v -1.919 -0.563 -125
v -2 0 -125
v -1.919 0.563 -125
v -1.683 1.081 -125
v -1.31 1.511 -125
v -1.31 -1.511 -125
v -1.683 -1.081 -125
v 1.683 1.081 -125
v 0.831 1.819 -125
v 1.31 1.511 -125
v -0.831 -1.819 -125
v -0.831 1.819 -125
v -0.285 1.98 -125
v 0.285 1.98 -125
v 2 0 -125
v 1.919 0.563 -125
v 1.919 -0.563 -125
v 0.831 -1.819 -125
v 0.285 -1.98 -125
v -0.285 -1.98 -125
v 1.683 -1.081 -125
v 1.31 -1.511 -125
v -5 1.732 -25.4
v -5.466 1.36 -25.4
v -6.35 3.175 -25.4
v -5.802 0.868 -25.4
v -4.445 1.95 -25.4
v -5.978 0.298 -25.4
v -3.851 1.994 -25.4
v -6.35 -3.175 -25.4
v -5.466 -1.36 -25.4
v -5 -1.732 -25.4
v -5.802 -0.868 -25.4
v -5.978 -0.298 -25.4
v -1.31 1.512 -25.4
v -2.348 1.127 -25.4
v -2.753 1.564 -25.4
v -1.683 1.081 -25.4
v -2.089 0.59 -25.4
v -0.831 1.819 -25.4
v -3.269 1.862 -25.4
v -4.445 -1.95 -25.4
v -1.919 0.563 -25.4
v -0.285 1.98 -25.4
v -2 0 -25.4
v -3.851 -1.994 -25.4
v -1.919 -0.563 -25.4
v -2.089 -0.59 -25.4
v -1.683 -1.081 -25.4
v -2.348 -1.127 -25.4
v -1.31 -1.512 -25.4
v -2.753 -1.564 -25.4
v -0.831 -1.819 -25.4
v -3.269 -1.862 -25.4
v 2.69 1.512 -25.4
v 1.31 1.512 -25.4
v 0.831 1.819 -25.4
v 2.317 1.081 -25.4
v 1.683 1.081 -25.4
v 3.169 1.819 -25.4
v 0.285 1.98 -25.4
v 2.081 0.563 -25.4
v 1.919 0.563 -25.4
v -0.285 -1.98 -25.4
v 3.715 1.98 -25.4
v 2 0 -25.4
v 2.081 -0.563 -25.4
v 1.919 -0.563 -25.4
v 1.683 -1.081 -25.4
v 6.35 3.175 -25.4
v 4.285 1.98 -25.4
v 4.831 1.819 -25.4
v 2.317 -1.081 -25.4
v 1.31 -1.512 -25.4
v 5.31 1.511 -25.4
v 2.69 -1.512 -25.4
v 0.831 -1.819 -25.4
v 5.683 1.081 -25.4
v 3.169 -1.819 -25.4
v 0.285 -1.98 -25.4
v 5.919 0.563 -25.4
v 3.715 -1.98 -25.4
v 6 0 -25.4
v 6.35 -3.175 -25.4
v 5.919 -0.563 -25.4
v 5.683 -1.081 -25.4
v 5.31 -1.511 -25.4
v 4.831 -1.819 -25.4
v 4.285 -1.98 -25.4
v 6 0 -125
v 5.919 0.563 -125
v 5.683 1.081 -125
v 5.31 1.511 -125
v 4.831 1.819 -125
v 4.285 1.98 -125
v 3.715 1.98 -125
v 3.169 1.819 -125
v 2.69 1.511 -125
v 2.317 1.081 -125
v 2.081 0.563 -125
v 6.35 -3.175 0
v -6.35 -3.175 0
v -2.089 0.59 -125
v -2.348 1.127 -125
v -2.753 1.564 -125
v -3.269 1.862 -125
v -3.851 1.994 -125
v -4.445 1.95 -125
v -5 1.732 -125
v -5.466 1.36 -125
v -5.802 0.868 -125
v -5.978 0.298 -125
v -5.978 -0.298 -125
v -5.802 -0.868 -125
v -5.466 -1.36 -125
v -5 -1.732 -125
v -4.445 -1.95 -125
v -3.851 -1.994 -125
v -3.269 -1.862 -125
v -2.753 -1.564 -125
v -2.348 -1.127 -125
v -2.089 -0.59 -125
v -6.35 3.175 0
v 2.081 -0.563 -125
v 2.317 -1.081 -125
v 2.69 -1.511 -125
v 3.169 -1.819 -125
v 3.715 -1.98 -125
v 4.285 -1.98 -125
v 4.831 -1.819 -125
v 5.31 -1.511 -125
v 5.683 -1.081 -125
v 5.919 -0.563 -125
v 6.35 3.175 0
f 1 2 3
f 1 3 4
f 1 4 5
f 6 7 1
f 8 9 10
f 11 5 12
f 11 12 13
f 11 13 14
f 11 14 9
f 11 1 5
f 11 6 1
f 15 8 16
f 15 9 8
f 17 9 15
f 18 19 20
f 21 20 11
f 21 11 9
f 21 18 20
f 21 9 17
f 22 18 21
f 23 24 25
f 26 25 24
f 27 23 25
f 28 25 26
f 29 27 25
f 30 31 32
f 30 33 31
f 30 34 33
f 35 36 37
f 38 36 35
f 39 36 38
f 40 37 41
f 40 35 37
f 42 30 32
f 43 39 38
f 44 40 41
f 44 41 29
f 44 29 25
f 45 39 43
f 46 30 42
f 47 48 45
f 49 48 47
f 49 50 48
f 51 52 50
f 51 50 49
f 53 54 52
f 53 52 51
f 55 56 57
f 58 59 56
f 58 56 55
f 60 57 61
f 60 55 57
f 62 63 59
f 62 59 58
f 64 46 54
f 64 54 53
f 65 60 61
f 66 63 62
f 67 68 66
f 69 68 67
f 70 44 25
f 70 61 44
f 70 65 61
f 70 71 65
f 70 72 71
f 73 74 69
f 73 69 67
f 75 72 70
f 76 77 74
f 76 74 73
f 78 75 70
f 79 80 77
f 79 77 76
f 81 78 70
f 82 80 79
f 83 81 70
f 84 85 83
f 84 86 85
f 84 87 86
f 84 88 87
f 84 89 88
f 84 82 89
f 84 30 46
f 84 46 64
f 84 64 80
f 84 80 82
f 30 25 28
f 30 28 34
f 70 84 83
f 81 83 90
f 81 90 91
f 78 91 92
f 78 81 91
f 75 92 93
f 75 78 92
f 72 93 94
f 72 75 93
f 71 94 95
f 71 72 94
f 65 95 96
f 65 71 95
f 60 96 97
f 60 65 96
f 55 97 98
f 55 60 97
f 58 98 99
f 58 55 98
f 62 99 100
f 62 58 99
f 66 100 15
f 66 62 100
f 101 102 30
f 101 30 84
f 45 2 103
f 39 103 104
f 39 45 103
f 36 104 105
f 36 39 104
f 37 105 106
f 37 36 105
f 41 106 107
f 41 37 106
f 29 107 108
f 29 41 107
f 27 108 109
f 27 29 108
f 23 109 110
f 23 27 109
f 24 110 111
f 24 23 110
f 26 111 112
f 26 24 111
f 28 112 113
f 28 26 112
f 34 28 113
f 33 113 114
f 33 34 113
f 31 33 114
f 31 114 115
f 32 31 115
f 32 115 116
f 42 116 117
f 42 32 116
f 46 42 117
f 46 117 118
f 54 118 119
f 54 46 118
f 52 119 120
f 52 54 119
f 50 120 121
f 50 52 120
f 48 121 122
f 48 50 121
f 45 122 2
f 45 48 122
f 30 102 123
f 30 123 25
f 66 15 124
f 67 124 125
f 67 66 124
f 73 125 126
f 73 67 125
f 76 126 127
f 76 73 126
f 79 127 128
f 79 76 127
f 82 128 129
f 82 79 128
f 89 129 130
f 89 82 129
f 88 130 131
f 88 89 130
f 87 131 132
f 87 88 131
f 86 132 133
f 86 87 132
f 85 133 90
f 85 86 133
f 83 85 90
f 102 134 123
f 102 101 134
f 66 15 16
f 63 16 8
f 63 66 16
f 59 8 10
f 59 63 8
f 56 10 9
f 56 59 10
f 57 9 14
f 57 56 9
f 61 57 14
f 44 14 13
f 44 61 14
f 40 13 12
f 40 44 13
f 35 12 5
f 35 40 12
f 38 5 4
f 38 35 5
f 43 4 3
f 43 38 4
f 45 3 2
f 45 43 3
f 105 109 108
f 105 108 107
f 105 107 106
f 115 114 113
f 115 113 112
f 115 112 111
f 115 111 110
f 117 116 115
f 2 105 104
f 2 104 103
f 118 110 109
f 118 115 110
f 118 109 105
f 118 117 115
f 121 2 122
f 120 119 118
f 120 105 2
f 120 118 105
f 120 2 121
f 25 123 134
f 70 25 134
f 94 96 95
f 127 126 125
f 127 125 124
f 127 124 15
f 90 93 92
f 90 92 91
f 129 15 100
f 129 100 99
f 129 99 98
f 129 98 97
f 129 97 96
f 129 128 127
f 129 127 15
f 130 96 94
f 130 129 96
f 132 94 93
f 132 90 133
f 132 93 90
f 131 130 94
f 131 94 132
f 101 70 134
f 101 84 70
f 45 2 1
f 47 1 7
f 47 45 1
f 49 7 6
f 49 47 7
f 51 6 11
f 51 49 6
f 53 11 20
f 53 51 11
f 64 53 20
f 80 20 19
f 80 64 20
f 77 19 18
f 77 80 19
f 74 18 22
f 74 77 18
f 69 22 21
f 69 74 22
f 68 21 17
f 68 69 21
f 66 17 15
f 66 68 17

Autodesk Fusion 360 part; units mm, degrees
sketch "Sketch1" plane through (0, 0, 0) normal (0, 1, 0) x (1, 0, 0)
  line L0 (-6.35, 25.4) -> (6.35, 25.4)
  line L1 (6.35, 25.4) -> (6.35, 0)
  line L2 (6.35, 0) -> (-6.35, 0)
  line L3 (-6.35, 0) -> (-6.35, 25.4)
  line L4 (-4, 25.4) -> (-4, 125)
  line L5 (-4, 125) -> (-2, 125)
  line L6 (-2, 125) -> (-2, 25.4)
  dimension "d1" = 25.4
  dimension "d2" = 12.7
  dimension "d5" = 125
  dimension "d6" = 2
  dimension "d12" = 2
extrude "Extrude1" add sketch "Sketch1" along normal mid plane 6.35 contours L0 L1 L2 L3
revolve "Revolve1" add sketch "Sketch1" angle 360 about axis through (-4, 0, -25.4) along (0, 0, -1) contours L0 L4 L5 L6
pattern_linear "R-Pattern1" count 3 spacing 4 along (1, 0, 0) of "Revolve1"
